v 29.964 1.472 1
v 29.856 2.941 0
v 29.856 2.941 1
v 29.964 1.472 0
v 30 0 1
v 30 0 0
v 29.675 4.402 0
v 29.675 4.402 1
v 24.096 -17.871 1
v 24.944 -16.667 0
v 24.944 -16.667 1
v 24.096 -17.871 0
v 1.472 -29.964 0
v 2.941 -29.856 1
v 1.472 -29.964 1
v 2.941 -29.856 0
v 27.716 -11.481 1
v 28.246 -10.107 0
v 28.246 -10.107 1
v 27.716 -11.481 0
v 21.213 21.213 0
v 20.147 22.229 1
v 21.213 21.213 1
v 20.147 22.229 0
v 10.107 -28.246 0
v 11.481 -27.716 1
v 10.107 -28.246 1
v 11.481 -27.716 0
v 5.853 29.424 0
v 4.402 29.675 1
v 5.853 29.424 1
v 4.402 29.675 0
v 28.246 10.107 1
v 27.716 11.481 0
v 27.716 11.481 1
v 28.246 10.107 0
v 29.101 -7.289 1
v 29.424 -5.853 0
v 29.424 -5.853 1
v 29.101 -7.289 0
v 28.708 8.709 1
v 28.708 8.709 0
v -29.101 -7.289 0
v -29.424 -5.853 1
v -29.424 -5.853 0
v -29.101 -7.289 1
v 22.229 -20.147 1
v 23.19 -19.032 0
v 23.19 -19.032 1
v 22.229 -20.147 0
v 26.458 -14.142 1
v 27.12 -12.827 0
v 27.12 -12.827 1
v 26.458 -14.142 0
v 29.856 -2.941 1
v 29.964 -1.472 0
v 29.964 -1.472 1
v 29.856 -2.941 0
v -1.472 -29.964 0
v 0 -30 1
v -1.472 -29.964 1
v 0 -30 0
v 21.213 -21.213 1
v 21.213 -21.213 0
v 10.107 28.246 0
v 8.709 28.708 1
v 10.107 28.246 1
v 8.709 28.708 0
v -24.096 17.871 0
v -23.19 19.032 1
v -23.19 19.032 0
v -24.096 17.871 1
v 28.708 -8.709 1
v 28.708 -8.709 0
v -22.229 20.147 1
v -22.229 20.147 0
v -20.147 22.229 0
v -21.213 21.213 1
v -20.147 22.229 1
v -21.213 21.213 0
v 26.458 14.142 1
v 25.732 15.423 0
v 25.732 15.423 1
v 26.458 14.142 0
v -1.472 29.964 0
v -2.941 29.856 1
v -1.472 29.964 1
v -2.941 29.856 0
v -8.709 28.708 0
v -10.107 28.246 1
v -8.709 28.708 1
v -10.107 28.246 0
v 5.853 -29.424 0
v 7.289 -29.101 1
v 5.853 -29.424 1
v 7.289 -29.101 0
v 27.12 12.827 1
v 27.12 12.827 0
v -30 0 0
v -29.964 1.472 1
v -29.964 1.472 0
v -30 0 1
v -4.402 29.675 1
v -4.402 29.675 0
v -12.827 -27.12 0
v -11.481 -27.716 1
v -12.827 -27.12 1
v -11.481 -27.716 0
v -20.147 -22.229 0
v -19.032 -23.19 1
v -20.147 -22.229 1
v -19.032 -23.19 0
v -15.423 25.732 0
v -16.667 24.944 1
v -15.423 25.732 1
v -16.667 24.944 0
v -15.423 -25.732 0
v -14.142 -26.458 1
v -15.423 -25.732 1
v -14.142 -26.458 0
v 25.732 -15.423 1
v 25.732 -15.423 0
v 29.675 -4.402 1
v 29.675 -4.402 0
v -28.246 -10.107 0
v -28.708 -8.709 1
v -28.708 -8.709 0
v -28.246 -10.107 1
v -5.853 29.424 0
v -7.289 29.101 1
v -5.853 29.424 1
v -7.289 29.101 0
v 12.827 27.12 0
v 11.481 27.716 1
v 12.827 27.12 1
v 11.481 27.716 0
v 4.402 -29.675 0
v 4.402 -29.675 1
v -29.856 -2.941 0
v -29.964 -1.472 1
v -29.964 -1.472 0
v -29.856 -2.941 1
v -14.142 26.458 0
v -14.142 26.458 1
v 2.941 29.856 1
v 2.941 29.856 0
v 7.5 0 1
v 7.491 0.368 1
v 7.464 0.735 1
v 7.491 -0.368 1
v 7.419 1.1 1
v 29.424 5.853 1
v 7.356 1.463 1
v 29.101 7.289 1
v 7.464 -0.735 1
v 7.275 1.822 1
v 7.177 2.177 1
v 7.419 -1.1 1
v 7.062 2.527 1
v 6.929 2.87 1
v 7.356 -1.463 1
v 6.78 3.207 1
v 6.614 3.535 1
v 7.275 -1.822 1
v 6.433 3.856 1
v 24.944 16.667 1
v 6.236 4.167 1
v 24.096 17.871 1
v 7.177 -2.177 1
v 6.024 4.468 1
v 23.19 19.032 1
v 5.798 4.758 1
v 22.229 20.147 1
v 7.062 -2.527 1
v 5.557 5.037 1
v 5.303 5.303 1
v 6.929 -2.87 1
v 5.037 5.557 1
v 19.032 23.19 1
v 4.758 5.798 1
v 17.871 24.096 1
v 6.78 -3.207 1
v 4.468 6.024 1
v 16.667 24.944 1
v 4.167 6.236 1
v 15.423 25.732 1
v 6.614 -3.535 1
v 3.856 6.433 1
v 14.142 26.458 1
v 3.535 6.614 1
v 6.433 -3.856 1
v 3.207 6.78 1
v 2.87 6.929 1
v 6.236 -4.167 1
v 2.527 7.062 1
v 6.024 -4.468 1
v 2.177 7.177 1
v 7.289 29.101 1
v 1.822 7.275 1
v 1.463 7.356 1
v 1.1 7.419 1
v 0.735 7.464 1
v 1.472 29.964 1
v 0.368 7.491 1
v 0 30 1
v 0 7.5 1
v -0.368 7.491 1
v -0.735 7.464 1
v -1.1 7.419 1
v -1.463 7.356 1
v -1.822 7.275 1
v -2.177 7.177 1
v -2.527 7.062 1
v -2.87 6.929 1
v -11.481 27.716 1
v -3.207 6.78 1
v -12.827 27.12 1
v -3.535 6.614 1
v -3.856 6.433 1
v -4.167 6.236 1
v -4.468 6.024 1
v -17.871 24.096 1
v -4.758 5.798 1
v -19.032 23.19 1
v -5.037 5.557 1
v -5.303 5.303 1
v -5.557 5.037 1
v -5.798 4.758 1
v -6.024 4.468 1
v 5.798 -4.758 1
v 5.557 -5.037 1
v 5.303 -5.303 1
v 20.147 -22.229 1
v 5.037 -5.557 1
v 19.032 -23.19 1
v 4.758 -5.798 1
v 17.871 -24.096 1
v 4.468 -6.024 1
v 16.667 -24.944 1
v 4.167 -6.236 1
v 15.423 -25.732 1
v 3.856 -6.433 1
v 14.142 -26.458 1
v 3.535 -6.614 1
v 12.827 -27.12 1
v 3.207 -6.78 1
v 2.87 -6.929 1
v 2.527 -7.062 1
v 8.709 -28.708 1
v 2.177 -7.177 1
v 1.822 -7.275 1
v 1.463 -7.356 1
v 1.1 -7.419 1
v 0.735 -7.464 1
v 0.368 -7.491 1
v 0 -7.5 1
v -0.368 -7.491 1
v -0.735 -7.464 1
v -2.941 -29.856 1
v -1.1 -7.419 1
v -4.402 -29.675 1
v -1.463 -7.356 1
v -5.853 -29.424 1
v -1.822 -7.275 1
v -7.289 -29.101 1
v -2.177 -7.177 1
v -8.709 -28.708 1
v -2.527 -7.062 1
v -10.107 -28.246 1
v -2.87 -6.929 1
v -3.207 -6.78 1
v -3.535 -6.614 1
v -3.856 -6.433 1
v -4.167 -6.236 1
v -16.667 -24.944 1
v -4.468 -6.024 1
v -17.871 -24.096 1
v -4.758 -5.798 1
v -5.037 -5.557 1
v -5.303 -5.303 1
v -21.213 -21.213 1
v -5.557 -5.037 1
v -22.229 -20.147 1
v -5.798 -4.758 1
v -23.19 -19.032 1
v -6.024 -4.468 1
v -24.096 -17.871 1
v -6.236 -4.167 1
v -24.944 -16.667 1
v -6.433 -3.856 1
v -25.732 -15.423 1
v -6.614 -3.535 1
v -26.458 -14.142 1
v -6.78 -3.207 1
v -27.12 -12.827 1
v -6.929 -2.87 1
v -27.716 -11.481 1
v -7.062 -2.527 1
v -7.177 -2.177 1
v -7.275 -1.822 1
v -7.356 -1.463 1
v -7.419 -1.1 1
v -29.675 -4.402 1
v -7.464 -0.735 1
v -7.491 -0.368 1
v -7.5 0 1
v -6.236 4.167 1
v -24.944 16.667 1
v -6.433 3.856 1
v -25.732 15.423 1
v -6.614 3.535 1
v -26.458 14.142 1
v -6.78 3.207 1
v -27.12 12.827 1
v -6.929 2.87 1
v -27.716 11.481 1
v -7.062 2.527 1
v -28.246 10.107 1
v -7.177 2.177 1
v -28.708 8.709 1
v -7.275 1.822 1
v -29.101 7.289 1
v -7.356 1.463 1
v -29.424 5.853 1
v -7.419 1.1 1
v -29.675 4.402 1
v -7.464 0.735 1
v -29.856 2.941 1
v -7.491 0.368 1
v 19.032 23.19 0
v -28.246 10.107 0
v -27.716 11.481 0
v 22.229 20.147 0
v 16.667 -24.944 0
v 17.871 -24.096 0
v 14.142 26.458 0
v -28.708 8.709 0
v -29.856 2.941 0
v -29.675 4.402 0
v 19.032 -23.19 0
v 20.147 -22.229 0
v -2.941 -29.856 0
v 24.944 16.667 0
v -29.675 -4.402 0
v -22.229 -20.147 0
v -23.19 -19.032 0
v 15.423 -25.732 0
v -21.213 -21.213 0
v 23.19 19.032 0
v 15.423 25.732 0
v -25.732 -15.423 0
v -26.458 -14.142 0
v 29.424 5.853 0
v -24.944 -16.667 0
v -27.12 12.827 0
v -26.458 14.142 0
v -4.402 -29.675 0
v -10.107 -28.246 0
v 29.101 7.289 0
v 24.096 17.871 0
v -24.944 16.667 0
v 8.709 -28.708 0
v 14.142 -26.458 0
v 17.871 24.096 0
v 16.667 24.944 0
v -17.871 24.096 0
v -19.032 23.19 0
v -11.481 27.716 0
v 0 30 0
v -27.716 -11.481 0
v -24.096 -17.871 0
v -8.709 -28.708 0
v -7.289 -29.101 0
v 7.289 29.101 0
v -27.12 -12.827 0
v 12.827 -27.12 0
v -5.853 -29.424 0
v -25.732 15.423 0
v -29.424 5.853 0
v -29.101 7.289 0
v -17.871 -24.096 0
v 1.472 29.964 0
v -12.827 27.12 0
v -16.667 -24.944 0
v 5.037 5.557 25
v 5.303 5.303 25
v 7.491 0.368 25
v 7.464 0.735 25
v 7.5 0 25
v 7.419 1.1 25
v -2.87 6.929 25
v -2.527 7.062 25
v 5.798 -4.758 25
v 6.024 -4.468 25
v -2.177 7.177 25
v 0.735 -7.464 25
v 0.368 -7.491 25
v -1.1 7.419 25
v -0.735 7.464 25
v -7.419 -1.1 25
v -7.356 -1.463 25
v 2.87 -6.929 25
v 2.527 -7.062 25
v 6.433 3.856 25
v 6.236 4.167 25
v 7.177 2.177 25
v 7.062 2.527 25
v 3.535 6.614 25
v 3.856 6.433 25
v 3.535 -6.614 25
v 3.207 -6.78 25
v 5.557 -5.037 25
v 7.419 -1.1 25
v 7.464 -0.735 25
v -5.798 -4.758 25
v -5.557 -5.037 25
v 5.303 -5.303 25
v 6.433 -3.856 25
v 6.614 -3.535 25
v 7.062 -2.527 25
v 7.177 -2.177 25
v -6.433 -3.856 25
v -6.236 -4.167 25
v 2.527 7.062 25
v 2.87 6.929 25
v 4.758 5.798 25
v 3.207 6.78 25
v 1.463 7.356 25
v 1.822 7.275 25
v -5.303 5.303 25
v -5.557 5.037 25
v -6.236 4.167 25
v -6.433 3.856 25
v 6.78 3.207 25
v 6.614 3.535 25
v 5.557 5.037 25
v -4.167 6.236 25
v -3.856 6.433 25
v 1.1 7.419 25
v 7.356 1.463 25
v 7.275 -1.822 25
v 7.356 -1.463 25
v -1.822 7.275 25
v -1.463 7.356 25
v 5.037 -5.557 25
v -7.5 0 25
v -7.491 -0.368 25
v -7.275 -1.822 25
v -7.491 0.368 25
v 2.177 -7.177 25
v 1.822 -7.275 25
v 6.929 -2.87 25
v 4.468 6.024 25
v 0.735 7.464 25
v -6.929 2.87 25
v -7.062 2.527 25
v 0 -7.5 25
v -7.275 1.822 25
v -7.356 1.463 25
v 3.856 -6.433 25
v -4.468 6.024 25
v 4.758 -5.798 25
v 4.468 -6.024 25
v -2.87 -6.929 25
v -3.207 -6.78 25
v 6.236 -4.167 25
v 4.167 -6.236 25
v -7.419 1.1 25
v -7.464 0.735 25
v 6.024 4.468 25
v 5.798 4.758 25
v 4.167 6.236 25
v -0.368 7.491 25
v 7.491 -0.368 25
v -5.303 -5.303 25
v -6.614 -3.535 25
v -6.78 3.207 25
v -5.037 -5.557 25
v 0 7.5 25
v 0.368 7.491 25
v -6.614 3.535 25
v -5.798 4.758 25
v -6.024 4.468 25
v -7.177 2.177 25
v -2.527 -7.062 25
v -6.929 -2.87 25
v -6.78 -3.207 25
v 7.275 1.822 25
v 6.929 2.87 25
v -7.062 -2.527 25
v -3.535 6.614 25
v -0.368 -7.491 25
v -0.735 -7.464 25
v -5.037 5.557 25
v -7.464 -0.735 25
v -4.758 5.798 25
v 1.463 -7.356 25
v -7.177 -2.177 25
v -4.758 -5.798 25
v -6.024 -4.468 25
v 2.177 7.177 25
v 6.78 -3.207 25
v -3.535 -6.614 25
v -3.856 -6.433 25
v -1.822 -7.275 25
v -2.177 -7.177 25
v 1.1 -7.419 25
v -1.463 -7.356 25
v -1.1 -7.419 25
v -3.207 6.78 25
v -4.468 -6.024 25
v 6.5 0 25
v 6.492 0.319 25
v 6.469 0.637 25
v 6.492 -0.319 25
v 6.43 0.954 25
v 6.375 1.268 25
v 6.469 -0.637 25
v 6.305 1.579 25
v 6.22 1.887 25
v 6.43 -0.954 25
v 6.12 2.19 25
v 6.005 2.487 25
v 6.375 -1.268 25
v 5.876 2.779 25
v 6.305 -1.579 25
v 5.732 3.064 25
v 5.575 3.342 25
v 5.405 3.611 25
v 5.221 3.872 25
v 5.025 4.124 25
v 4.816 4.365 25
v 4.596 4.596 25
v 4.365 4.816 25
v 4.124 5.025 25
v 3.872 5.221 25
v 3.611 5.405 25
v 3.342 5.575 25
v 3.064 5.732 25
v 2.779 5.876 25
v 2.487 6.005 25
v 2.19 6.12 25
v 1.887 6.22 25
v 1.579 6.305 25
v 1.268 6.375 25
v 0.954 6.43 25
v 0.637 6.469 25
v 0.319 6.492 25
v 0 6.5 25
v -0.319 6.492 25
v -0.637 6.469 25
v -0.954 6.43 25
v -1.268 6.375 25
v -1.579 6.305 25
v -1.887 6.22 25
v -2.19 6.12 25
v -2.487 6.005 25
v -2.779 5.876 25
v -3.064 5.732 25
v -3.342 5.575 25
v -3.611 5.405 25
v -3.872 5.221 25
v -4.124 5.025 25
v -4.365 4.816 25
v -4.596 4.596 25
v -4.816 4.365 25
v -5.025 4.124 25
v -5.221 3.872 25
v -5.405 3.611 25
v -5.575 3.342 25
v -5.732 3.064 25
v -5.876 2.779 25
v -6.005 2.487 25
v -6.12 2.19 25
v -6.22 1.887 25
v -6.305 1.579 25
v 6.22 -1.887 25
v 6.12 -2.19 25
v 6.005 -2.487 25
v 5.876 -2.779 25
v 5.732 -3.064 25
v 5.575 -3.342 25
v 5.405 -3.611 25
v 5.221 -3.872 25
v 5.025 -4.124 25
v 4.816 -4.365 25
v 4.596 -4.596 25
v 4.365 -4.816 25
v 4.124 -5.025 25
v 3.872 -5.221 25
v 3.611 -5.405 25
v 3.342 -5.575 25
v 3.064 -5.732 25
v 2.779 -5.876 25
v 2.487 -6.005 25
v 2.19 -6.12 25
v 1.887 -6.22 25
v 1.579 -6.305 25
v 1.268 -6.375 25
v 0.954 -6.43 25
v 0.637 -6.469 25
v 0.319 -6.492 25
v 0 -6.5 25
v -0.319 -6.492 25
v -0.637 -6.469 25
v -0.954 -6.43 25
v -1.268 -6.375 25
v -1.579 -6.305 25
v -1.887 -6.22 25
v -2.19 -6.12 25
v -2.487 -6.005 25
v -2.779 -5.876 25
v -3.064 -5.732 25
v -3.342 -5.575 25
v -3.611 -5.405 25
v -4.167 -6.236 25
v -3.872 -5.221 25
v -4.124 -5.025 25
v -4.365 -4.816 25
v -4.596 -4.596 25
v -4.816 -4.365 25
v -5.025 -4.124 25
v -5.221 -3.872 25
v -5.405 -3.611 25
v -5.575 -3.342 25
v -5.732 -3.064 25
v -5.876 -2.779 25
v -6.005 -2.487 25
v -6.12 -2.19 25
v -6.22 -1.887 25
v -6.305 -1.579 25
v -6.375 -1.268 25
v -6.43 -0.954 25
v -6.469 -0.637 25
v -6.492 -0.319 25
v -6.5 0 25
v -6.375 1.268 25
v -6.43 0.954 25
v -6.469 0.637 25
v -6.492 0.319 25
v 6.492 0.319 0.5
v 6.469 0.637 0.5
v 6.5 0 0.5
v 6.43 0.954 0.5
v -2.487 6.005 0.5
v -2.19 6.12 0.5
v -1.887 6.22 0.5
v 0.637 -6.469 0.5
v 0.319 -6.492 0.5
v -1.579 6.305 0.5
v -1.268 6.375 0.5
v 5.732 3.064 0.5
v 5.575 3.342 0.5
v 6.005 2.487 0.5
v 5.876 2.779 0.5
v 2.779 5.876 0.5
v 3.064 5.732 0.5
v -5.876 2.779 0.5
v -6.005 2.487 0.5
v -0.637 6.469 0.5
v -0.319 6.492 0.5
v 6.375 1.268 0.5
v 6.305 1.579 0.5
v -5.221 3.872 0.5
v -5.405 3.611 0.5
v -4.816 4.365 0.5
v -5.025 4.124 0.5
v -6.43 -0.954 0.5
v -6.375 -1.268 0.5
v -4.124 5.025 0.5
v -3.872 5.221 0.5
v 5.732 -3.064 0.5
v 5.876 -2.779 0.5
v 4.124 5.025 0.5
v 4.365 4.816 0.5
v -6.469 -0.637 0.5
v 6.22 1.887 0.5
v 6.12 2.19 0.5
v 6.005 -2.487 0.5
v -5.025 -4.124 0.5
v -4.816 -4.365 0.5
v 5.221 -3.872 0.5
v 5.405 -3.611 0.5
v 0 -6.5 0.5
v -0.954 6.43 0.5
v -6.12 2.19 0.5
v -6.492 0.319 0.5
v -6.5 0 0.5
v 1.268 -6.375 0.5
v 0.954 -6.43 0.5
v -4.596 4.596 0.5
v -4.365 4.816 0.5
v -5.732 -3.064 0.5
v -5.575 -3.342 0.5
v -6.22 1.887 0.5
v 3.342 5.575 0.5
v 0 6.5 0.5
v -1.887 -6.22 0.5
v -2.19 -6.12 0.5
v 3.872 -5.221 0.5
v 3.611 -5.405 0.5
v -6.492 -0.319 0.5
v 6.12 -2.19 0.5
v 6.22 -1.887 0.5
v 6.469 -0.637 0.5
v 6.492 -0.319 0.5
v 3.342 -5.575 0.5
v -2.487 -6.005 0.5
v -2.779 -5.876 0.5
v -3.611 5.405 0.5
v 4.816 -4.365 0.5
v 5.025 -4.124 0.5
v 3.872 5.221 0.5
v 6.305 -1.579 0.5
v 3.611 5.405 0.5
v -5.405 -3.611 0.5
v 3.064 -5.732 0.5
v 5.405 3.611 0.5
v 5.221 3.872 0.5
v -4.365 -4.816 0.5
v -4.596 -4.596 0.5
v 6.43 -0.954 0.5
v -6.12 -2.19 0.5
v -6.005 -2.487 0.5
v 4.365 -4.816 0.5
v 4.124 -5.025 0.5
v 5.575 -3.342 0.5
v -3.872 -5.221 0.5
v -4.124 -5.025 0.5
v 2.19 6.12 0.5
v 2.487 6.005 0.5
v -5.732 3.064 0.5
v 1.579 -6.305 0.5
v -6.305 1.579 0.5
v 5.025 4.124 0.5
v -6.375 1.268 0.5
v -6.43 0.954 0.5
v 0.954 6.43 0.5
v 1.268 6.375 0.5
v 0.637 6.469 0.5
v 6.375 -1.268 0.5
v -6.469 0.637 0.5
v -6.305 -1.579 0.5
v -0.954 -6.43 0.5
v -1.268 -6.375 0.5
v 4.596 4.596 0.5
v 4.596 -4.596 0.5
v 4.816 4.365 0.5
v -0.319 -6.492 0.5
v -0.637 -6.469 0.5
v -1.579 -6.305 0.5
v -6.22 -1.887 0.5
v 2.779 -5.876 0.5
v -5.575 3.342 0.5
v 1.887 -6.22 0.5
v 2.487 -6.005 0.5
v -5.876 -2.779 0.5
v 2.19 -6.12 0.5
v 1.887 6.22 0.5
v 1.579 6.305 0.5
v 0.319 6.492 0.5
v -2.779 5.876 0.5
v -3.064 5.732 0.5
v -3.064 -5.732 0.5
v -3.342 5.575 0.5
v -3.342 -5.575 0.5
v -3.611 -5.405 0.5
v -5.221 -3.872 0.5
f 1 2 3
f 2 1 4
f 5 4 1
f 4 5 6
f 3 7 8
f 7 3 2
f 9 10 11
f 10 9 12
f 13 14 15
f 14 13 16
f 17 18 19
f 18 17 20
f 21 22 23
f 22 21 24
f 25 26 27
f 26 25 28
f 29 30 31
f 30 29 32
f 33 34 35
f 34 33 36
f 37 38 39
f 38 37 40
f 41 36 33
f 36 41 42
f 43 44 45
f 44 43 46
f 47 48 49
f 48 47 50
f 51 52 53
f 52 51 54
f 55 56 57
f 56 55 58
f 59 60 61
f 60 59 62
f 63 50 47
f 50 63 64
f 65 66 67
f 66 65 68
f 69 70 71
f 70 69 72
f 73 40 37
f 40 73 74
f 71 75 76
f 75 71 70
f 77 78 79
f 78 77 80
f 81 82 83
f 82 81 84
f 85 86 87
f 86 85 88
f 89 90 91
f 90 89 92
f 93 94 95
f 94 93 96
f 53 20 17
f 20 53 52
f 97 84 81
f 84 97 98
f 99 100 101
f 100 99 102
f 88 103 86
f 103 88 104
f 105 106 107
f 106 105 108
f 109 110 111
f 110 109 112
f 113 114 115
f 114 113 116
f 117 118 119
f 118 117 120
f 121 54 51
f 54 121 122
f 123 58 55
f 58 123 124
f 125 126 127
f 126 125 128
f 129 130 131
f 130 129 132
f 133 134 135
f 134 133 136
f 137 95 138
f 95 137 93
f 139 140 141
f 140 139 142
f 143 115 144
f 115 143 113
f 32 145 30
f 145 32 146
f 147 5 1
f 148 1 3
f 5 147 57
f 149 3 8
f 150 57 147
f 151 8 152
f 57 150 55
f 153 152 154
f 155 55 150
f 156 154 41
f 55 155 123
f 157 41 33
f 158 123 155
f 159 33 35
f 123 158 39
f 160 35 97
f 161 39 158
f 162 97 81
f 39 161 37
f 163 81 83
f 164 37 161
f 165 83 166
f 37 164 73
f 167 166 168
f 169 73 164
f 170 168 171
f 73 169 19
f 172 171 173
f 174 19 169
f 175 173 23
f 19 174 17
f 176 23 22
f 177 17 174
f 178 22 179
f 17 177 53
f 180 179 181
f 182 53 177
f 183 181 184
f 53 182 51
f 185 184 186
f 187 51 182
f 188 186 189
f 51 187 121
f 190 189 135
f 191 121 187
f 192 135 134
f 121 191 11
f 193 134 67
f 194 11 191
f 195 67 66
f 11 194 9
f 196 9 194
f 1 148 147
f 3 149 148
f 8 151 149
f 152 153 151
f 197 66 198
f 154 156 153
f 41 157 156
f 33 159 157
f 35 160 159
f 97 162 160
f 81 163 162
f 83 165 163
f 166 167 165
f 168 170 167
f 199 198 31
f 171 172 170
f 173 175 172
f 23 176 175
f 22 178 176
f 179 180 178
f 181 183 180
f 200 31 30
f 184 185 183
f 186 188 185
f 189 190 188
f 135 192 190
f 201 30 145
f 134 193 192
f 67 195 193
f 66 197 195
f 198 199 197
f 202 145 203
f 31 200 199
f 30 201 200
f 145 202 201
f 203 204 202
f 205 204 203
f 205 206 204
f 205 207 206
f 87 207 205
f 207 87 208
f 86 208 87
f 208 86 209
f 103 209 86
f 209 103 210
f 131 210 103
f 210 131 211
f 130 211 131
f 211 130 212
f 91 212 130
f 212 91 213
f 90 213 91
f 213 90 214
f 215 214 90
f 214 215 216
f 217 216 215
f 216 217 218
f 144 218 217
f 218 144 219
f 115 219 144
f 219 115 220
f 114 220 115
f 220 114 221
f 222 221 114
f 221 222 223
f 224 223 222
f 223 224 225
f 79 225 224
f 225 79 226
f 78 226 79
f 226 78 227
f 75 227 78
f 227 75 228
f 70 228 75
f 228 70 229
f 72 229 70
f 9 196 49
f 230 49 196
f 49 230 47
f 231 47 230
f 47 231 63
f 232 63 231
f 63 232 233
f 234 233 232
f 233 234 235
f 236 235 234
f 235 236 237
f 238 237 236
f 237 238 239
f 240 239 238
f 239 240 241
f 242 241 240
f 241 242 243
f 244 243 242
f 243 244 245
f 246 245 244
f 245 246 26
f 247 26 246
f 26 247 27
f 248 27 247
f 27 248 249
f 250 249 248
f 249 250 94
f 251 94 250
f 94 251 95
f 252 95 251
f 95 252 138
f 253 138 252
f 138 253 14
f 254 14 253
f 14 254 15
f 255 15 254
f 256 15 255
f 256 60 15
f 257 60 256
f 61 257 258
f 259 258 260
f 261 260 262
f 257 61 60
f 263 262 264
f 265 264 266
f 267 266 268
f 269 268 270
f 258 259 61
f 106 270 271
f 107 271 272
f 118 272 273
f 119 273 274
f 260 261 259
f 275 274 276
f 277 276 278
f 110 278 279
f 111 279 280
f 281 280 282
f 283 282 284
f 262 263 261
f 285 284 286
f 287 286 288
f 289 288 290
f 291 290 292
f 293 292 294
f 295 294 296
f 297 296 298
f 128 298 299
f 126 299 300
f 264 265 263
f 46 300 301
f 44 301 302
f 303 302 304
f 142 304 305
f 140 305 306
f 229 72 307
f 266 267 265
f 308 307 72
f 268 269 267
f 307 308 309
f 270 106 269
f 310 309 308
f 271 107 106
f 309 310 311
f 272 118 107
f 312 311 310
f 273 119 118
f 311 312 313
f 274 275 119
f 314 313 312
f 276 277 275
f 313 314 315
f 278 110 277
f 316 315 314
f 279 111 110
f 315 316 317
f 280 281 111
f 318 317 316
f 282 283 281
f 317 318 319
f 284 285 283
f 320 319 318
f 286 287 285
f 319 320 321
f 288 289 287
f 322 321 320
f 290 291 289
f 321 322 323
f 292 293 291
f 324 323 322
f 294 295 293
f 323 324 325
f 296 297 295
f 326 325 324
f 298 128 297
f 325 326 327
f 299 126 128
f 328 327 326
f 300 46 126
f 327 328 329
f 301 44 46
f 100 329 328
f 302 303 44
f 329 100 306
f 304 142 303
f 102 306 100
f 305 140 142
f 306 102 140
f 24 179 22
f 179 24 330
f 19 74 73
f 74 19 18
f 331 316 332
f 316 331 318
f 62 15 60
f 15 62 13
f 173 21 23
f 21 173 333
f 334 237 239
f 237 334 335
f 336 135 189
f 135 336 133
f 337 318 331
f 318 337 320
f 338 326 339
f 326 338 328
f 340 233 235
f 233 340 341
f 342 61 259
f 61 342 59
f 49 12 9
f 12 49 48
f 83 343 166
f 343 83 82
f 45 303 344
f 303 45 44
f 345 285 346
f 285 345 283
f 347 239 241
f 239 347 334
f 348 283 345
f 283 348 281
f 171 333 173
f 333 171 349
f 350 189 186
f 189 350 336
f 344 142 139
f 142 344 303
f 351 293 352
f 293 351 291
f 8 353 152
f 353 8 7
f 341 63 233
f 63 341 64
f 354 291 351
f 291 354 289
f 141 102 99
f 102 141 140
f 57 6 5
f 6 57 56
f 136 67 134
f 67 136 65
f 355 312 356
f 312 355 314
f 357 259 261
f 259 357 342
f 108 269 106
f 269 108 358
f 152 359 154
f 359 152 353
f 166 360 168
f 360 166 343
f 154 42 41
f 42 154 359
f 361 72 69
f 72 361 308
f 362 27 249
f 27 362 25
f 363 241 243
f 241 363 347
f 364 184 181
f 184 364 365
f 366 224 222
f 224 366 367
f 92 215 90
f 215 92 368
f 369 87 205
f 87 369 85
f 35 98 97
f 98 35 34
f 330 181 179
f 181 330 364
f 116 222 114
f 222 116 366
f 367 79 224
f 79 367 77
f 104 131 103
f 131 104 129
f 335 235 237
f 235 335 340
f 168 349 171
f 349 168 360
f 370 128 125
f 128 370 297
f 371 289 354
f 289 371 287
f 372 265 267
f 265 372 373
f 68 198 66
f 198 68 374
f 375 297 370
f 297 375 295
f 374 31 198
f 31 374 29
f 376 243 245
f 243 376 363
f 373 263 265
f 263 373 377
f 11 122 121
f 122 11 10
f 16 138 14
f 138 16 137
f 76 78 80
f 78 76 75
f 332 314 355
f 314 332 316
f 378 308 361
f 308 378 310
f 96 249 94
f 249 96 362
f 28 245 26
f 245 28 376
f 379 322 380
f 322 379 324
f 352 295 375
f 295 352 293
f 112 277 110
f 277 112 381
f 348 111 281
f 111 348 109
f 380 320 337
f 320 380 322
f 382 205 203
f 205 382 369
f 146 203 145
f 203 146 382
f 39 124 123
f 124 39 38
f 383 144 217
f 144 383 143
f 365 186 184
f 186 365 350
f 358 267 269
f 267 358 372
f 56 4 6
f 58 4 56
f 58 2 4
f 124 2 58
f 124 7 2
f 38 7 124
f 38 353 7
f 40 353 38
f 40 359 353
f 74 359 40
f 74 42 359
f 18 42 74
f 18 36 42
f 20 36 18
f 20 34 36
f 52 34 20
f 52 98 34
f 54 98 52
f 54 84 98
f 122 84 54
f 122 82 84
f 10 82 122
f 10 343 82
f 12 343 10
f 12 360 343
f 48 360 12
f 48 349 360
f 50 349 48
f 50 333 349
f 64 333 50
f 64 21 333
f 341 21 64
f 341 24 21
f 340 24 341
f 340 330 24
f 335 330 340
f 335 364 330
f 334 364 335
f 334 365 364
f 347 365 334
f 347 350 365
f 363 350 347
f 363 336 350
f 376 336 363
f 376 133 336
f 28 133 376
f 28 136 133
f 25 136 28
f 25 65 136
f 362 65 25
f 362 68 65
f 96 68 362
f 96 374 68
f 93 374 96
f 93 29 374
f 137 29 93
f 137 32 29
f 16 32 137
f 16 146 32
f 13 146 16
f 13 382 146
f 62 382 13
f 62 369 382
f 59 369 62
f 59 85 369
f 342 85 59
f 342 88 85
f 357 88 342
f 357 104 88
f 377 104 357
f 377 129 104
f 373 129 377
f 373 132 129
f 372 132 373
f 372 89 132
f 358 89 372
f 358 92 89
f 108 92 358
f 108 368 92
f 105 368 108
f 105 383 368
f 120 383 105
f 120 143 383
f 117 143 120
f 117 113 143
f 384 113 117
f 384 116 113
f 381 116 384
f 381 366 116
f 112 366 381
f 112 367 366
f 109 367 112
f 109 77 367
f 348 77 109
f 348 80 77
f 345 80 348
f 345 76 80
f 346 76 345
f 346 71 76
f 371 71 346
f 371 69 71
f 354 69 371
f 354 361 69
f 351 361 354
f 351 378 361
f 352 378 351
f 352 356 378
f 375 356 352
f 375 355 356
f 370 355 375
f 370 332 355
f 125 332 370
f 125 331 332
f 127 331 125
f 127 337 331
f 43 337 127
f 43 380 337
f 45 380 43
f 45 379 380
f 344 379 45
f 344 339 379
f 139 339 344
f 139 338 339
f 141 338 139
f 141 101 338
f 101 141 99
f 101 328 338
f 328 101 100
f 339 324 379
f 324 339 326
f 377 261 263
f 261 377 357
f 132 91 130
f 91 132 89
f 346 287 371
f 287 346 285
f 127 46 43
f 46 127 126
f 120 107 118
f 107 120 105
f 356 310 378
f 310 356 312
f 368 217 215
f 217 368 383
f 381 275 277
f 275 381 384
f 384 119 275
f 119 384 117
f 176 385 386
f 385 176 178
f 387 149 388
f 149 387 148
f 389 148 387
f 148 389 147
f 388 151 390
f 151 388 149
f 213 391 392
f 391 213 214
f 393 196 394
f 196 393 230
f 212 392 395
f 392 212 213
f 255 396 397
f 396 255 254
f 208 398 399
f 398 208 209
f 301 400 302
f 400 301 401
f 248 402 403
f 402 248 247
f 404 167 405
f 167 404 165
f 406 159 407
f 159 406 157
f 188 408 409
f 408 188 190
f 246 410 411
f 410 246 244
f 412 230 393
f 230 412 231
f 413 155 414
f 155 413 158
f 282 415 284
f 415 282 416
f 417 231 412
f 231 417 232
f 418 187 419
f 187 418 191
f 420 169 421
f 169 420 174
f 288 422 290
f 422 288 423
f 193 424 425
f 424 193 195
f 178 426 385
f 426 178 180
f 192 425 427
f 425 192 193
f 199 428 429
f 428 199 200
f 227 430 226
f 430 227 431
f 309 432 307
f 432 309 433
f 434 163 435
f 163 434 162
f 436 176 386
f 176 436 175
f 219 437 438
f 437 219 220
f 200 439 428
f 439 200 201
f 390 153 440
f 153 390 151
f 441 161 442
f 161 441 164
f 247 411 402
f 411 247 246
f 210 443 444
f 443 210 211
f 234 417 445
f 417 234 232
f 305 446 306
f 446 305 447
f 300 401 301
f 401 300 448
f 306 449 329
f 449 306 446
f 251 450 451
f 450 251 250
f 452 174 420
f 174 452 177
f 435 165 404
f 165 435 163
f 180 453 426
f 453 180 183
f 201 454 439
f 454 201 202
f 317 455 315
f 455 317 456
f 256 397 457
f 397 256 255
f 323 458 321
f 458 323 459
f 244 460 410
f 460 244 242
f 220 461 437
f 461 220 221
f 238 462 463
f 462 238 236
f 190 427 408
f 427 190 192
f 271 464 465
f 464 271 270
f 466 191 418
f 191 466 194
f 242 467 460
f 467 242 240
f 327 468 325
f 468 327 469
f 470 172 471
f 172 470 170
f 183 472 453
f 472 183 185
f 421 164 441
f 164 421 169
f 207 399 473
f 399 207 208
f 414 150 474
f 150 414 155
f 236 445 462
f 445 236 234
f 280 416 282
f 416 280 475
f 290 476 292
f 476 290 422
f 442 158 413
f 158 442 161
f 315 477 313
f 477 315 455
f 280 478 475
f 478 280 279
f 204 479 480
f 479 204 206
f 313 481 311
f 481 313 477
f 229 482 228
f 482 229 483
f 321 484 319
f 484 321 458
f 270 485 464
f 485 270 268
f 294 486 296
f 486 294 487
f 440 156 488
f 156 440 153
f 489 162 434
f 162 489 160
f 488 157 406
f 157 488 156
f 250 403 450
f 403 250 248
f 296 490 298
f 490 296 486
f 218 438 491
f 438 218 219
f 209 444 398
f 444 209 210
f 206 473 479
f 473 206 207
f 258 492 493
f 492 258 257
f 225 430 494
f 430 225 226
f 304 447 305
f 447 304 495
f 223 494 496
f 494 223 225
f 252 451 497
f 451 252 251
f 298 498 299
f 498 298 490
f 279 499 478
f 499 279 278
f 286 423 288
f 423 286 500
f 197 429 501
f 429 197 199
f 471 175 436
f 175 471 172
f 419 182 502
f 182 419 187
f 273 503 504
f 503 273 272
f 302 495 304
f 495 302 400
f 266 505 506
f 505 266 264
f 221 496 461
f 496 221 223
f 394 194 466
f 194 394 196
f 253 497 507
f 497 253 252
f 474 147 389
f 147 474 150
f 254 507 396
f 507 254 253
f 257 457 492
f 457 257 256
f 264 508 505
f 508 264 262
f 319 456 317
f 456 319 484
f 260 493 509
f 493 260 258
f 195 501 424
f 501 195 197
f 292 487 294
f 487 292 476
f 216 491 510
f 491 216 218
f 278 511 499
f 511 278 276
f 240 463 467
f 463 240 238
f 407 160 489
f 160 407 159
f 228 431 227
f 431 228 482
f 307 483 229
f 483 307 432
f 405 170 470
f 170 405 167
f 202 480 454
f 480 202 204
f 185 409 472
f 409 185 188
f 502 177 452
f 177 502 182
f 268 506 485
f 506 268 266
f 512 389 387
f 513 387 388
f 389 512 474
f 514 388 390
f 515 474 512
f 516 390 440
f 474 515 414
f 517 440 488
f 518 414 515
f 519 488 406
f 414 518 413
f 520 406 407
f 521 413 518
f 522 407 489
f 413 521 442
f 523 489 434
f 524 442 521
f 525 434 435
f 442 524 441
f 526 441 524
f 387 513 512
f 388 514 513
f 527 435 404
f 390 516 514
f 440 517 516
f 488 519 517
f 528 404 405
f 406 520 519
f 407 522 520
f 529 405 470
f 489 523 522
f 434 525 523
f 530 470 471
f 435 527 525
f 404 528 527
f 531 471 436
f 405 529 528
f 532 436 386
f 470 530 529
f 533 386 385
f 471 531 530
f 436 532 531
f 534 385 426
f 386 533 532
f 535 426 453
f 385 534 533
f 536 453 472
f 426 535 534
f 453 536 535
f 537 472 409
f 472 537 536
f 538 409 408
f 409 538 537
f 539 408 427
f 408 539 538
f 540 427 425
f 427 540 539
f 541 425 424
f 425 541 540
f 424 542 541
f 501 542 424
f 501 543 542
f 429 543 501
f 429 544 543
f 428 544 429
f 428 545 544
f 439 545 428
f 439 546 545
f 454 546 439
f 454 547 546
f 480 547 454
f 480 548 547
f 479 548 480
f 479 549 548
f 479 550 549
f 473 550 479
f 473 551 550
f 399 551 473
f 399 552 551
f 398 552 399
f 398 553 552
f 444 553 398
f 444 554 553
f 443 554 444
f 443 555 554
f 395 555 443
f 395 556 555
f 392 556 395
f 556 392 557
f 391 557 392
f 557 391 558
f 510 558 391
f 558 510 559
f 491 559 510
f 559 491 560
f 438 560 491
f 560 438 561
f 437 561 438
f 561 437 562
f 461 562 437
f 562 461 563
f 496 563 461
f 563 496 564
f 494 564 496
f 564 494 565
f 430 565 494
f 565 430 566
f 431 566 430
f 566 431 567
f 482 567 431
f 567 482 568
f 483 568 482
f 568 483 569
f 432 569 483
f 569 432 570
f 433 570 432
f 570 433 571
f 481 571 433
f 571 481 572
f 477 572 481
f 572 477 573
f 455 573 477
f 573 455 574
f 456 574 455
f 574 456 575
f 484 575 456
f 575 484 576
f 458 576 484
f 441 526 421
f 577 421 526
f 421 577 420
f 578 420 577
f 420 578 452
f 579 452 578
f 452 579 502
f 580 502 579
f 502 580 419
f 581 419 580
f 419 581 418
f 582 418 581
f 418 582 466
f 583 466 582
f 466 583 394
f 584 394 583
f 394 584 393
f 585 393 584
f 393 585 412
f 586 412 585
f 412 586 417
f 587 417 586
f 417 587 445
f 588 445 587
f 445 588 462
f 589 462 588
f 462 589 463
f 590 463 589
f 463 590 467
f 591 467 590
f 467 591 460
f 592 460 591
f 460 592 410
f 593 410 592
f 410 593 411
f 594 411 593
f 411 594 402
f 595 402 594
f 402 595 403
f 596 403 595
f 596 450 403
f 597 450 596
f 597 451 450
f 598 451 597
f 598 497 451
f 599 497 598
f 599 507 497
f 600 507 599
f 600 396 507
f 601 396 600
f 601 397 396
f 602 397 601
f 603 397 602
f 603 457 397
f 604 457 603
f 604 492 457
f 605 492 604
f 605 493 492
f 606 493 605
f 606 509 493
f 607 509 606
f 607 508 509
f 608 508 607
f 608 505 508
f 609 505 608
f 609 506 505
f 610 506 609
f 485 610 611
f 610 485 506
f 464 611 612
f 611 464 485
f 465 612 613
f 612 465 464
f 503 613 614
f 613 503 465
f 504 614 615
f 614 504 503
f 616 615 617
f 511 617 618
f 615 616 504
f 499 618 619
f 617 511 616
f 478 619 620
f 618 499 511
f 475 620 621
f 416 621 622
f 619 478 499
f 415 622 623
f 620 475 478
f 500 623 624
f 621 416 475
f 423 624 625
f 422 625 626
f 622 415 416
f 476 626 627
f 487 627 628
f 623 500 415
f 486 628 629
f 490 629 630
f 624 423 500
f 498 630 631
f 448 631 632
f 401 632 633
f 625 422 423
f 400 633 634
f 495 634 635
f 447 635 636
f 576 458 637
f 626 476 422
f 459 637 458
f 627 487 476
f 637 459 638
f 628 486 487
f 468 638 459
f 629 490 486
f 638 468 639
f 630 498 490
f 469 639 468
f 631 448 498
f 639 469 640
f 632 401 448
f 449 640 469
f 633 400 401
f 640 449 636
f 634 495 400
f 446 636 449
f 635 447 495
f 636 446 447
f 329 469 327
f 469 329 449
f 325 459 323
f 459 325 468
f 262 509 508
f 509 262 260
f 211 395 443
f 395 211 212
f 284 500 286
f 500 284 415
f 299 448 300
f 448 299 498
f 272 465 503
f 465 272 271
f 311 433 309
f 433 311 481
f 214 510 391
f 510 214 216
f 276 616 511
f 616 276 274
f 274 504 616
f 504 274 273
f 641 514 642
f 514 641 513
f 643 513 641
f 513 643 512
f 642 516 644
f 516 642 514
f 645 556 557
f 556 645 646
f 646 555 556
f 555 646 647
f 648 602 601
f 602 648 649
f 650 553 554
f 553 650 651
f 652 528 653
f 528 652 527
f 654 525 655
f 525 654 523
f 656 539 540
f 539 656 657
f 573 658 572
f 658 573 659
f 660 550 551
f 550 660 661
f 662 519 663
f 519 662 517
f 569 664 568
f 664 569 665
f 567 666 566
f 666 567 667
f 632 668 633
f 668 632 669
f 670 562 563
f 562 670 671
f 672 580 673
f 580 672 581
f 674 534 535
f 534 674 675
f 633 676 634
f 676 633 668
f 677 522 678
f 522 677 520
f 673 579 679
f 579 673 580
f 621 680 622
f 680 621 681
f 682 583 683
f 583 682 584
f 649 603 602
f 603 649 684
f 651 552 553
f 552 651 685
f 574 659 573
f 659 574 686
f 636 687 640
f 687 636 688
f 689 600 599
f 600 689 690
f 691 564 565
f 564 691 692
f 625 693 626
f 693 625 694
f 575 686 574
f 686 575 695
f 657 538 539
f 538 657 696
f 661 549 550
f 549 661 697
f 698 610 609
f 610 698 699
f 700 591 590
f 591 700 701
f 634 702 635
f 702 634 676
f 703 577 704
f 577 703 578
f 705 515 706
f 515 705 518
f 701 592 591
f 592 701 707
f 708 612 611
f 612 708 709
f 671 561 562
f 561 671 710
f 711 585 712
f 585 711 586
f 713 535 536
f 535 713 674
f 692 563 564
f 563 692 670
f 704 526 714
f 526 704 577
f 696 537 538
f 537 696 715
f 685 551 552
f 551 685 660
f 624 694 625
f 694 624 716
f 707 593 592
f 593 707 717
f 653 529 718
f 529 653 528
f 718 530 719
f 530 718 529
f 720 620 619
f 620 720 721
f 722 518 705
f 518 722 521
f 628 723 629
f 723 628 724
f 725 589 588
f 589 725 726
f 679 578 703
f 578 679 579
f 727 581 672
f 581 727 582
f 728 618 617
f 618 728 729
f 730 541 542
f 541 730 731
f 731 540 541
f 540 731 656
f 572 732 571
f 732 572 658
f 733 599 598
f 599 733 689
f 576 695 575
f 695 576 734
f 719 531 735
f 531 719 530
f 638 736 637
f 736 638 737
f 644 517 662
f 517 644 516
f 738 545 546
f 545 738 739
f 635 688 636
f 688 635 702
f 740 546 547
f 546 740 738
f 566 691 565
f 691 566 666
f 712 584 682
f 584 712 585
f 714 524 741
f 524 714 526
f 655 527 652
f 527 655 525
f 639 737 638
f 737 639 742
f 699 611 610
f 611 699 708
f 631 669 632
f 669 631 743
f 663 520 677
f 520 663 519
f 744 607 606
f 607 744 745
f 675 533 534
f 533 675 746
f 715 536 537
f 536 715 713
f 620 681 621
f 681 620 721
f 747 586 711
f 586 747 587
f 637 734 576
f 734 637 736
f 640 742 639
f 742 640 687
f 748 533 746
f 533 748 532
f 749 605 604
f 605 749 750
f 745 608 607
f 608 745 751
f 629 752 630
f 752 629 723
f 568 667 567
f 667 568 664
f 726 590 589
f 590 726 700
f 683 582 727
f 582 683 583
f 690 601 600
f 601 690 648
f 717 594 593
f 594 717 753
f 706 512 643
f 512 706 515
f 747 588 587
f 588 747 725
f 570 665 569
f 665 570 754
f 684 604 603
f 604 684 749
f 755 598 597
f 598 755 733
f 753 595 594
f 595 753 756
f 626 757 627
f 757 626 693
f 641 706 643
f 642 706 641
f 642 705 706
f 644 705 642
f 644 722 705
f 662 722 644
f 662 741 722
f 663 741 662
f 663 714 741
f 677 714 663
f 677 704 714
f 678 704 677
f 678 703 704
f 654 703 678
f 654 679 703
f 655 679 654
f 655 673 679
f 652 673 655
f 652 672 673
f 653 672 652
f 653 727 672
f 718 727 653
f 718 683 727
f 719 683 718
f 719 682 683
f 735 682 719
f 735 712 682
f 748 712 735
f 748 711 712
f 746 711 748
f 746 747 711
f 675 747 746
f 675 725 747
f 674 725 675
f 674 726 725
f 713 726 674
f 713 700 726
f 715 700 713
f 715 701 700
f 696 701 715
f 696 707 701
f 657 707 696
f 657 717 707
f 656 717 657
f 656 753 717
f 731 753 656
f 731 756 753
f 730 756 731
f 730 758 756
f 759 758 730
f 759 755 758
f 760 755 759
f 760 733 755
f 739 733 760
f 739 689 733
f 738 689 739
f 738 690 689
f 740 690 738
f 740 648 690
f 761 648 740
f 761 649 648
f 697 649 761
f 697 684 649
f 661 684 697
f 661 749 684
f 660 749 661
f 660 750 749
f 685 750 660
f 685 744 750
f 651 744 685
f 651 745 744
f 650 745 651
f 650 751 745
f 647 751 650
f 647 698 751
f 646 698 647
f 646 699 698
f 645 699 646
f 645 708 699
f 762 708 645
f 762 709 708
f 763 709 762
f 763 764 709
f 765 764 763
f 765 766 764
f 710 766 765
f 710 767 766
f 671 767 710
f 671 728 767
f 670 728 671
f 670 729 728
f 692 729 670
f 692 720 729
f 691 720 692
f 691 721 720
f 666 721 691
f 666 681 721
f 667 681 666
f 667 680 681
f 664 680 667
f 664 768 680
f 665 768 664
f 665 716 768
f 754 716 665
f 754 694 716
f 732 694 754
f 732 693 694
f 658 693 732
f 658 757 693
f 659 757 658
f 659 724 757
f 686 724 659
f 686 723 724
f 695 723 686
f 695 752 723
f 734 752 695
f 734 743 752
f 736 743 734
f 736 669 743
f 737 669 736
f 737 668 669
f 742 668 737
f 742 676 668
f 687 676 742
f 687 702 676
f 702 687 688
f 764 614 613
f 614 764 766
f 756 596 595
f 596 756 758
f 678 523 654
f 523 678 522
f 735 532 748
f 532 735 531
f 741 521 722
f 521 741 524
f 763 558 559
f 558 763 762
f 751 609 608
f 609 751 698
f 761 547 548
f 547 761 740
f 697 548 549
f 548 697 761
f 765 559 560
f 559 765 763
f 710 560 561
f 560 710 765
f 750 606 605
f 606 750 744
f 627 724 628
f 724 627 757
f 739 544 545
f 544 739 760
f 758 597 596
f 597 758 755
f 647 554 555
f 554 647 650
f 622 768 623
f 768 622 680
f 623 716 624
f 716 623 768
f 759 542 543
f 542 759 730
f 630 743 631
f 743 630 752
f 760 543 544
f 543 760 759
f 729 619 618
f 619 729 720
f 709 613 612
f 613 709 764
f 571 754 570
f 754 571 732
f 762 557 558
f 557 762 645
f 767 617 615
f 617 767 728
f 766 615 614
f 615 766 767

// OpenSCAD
$fn = 128;

difference() {
    union() {
        cylinder(h = 1, d = 60);
        cylinder(h = 25, d = 15);
    }
    translate([0, 0, 25 - 24.5])
        cylinder(h = 24.5 + 0.01, d = 13);
}
